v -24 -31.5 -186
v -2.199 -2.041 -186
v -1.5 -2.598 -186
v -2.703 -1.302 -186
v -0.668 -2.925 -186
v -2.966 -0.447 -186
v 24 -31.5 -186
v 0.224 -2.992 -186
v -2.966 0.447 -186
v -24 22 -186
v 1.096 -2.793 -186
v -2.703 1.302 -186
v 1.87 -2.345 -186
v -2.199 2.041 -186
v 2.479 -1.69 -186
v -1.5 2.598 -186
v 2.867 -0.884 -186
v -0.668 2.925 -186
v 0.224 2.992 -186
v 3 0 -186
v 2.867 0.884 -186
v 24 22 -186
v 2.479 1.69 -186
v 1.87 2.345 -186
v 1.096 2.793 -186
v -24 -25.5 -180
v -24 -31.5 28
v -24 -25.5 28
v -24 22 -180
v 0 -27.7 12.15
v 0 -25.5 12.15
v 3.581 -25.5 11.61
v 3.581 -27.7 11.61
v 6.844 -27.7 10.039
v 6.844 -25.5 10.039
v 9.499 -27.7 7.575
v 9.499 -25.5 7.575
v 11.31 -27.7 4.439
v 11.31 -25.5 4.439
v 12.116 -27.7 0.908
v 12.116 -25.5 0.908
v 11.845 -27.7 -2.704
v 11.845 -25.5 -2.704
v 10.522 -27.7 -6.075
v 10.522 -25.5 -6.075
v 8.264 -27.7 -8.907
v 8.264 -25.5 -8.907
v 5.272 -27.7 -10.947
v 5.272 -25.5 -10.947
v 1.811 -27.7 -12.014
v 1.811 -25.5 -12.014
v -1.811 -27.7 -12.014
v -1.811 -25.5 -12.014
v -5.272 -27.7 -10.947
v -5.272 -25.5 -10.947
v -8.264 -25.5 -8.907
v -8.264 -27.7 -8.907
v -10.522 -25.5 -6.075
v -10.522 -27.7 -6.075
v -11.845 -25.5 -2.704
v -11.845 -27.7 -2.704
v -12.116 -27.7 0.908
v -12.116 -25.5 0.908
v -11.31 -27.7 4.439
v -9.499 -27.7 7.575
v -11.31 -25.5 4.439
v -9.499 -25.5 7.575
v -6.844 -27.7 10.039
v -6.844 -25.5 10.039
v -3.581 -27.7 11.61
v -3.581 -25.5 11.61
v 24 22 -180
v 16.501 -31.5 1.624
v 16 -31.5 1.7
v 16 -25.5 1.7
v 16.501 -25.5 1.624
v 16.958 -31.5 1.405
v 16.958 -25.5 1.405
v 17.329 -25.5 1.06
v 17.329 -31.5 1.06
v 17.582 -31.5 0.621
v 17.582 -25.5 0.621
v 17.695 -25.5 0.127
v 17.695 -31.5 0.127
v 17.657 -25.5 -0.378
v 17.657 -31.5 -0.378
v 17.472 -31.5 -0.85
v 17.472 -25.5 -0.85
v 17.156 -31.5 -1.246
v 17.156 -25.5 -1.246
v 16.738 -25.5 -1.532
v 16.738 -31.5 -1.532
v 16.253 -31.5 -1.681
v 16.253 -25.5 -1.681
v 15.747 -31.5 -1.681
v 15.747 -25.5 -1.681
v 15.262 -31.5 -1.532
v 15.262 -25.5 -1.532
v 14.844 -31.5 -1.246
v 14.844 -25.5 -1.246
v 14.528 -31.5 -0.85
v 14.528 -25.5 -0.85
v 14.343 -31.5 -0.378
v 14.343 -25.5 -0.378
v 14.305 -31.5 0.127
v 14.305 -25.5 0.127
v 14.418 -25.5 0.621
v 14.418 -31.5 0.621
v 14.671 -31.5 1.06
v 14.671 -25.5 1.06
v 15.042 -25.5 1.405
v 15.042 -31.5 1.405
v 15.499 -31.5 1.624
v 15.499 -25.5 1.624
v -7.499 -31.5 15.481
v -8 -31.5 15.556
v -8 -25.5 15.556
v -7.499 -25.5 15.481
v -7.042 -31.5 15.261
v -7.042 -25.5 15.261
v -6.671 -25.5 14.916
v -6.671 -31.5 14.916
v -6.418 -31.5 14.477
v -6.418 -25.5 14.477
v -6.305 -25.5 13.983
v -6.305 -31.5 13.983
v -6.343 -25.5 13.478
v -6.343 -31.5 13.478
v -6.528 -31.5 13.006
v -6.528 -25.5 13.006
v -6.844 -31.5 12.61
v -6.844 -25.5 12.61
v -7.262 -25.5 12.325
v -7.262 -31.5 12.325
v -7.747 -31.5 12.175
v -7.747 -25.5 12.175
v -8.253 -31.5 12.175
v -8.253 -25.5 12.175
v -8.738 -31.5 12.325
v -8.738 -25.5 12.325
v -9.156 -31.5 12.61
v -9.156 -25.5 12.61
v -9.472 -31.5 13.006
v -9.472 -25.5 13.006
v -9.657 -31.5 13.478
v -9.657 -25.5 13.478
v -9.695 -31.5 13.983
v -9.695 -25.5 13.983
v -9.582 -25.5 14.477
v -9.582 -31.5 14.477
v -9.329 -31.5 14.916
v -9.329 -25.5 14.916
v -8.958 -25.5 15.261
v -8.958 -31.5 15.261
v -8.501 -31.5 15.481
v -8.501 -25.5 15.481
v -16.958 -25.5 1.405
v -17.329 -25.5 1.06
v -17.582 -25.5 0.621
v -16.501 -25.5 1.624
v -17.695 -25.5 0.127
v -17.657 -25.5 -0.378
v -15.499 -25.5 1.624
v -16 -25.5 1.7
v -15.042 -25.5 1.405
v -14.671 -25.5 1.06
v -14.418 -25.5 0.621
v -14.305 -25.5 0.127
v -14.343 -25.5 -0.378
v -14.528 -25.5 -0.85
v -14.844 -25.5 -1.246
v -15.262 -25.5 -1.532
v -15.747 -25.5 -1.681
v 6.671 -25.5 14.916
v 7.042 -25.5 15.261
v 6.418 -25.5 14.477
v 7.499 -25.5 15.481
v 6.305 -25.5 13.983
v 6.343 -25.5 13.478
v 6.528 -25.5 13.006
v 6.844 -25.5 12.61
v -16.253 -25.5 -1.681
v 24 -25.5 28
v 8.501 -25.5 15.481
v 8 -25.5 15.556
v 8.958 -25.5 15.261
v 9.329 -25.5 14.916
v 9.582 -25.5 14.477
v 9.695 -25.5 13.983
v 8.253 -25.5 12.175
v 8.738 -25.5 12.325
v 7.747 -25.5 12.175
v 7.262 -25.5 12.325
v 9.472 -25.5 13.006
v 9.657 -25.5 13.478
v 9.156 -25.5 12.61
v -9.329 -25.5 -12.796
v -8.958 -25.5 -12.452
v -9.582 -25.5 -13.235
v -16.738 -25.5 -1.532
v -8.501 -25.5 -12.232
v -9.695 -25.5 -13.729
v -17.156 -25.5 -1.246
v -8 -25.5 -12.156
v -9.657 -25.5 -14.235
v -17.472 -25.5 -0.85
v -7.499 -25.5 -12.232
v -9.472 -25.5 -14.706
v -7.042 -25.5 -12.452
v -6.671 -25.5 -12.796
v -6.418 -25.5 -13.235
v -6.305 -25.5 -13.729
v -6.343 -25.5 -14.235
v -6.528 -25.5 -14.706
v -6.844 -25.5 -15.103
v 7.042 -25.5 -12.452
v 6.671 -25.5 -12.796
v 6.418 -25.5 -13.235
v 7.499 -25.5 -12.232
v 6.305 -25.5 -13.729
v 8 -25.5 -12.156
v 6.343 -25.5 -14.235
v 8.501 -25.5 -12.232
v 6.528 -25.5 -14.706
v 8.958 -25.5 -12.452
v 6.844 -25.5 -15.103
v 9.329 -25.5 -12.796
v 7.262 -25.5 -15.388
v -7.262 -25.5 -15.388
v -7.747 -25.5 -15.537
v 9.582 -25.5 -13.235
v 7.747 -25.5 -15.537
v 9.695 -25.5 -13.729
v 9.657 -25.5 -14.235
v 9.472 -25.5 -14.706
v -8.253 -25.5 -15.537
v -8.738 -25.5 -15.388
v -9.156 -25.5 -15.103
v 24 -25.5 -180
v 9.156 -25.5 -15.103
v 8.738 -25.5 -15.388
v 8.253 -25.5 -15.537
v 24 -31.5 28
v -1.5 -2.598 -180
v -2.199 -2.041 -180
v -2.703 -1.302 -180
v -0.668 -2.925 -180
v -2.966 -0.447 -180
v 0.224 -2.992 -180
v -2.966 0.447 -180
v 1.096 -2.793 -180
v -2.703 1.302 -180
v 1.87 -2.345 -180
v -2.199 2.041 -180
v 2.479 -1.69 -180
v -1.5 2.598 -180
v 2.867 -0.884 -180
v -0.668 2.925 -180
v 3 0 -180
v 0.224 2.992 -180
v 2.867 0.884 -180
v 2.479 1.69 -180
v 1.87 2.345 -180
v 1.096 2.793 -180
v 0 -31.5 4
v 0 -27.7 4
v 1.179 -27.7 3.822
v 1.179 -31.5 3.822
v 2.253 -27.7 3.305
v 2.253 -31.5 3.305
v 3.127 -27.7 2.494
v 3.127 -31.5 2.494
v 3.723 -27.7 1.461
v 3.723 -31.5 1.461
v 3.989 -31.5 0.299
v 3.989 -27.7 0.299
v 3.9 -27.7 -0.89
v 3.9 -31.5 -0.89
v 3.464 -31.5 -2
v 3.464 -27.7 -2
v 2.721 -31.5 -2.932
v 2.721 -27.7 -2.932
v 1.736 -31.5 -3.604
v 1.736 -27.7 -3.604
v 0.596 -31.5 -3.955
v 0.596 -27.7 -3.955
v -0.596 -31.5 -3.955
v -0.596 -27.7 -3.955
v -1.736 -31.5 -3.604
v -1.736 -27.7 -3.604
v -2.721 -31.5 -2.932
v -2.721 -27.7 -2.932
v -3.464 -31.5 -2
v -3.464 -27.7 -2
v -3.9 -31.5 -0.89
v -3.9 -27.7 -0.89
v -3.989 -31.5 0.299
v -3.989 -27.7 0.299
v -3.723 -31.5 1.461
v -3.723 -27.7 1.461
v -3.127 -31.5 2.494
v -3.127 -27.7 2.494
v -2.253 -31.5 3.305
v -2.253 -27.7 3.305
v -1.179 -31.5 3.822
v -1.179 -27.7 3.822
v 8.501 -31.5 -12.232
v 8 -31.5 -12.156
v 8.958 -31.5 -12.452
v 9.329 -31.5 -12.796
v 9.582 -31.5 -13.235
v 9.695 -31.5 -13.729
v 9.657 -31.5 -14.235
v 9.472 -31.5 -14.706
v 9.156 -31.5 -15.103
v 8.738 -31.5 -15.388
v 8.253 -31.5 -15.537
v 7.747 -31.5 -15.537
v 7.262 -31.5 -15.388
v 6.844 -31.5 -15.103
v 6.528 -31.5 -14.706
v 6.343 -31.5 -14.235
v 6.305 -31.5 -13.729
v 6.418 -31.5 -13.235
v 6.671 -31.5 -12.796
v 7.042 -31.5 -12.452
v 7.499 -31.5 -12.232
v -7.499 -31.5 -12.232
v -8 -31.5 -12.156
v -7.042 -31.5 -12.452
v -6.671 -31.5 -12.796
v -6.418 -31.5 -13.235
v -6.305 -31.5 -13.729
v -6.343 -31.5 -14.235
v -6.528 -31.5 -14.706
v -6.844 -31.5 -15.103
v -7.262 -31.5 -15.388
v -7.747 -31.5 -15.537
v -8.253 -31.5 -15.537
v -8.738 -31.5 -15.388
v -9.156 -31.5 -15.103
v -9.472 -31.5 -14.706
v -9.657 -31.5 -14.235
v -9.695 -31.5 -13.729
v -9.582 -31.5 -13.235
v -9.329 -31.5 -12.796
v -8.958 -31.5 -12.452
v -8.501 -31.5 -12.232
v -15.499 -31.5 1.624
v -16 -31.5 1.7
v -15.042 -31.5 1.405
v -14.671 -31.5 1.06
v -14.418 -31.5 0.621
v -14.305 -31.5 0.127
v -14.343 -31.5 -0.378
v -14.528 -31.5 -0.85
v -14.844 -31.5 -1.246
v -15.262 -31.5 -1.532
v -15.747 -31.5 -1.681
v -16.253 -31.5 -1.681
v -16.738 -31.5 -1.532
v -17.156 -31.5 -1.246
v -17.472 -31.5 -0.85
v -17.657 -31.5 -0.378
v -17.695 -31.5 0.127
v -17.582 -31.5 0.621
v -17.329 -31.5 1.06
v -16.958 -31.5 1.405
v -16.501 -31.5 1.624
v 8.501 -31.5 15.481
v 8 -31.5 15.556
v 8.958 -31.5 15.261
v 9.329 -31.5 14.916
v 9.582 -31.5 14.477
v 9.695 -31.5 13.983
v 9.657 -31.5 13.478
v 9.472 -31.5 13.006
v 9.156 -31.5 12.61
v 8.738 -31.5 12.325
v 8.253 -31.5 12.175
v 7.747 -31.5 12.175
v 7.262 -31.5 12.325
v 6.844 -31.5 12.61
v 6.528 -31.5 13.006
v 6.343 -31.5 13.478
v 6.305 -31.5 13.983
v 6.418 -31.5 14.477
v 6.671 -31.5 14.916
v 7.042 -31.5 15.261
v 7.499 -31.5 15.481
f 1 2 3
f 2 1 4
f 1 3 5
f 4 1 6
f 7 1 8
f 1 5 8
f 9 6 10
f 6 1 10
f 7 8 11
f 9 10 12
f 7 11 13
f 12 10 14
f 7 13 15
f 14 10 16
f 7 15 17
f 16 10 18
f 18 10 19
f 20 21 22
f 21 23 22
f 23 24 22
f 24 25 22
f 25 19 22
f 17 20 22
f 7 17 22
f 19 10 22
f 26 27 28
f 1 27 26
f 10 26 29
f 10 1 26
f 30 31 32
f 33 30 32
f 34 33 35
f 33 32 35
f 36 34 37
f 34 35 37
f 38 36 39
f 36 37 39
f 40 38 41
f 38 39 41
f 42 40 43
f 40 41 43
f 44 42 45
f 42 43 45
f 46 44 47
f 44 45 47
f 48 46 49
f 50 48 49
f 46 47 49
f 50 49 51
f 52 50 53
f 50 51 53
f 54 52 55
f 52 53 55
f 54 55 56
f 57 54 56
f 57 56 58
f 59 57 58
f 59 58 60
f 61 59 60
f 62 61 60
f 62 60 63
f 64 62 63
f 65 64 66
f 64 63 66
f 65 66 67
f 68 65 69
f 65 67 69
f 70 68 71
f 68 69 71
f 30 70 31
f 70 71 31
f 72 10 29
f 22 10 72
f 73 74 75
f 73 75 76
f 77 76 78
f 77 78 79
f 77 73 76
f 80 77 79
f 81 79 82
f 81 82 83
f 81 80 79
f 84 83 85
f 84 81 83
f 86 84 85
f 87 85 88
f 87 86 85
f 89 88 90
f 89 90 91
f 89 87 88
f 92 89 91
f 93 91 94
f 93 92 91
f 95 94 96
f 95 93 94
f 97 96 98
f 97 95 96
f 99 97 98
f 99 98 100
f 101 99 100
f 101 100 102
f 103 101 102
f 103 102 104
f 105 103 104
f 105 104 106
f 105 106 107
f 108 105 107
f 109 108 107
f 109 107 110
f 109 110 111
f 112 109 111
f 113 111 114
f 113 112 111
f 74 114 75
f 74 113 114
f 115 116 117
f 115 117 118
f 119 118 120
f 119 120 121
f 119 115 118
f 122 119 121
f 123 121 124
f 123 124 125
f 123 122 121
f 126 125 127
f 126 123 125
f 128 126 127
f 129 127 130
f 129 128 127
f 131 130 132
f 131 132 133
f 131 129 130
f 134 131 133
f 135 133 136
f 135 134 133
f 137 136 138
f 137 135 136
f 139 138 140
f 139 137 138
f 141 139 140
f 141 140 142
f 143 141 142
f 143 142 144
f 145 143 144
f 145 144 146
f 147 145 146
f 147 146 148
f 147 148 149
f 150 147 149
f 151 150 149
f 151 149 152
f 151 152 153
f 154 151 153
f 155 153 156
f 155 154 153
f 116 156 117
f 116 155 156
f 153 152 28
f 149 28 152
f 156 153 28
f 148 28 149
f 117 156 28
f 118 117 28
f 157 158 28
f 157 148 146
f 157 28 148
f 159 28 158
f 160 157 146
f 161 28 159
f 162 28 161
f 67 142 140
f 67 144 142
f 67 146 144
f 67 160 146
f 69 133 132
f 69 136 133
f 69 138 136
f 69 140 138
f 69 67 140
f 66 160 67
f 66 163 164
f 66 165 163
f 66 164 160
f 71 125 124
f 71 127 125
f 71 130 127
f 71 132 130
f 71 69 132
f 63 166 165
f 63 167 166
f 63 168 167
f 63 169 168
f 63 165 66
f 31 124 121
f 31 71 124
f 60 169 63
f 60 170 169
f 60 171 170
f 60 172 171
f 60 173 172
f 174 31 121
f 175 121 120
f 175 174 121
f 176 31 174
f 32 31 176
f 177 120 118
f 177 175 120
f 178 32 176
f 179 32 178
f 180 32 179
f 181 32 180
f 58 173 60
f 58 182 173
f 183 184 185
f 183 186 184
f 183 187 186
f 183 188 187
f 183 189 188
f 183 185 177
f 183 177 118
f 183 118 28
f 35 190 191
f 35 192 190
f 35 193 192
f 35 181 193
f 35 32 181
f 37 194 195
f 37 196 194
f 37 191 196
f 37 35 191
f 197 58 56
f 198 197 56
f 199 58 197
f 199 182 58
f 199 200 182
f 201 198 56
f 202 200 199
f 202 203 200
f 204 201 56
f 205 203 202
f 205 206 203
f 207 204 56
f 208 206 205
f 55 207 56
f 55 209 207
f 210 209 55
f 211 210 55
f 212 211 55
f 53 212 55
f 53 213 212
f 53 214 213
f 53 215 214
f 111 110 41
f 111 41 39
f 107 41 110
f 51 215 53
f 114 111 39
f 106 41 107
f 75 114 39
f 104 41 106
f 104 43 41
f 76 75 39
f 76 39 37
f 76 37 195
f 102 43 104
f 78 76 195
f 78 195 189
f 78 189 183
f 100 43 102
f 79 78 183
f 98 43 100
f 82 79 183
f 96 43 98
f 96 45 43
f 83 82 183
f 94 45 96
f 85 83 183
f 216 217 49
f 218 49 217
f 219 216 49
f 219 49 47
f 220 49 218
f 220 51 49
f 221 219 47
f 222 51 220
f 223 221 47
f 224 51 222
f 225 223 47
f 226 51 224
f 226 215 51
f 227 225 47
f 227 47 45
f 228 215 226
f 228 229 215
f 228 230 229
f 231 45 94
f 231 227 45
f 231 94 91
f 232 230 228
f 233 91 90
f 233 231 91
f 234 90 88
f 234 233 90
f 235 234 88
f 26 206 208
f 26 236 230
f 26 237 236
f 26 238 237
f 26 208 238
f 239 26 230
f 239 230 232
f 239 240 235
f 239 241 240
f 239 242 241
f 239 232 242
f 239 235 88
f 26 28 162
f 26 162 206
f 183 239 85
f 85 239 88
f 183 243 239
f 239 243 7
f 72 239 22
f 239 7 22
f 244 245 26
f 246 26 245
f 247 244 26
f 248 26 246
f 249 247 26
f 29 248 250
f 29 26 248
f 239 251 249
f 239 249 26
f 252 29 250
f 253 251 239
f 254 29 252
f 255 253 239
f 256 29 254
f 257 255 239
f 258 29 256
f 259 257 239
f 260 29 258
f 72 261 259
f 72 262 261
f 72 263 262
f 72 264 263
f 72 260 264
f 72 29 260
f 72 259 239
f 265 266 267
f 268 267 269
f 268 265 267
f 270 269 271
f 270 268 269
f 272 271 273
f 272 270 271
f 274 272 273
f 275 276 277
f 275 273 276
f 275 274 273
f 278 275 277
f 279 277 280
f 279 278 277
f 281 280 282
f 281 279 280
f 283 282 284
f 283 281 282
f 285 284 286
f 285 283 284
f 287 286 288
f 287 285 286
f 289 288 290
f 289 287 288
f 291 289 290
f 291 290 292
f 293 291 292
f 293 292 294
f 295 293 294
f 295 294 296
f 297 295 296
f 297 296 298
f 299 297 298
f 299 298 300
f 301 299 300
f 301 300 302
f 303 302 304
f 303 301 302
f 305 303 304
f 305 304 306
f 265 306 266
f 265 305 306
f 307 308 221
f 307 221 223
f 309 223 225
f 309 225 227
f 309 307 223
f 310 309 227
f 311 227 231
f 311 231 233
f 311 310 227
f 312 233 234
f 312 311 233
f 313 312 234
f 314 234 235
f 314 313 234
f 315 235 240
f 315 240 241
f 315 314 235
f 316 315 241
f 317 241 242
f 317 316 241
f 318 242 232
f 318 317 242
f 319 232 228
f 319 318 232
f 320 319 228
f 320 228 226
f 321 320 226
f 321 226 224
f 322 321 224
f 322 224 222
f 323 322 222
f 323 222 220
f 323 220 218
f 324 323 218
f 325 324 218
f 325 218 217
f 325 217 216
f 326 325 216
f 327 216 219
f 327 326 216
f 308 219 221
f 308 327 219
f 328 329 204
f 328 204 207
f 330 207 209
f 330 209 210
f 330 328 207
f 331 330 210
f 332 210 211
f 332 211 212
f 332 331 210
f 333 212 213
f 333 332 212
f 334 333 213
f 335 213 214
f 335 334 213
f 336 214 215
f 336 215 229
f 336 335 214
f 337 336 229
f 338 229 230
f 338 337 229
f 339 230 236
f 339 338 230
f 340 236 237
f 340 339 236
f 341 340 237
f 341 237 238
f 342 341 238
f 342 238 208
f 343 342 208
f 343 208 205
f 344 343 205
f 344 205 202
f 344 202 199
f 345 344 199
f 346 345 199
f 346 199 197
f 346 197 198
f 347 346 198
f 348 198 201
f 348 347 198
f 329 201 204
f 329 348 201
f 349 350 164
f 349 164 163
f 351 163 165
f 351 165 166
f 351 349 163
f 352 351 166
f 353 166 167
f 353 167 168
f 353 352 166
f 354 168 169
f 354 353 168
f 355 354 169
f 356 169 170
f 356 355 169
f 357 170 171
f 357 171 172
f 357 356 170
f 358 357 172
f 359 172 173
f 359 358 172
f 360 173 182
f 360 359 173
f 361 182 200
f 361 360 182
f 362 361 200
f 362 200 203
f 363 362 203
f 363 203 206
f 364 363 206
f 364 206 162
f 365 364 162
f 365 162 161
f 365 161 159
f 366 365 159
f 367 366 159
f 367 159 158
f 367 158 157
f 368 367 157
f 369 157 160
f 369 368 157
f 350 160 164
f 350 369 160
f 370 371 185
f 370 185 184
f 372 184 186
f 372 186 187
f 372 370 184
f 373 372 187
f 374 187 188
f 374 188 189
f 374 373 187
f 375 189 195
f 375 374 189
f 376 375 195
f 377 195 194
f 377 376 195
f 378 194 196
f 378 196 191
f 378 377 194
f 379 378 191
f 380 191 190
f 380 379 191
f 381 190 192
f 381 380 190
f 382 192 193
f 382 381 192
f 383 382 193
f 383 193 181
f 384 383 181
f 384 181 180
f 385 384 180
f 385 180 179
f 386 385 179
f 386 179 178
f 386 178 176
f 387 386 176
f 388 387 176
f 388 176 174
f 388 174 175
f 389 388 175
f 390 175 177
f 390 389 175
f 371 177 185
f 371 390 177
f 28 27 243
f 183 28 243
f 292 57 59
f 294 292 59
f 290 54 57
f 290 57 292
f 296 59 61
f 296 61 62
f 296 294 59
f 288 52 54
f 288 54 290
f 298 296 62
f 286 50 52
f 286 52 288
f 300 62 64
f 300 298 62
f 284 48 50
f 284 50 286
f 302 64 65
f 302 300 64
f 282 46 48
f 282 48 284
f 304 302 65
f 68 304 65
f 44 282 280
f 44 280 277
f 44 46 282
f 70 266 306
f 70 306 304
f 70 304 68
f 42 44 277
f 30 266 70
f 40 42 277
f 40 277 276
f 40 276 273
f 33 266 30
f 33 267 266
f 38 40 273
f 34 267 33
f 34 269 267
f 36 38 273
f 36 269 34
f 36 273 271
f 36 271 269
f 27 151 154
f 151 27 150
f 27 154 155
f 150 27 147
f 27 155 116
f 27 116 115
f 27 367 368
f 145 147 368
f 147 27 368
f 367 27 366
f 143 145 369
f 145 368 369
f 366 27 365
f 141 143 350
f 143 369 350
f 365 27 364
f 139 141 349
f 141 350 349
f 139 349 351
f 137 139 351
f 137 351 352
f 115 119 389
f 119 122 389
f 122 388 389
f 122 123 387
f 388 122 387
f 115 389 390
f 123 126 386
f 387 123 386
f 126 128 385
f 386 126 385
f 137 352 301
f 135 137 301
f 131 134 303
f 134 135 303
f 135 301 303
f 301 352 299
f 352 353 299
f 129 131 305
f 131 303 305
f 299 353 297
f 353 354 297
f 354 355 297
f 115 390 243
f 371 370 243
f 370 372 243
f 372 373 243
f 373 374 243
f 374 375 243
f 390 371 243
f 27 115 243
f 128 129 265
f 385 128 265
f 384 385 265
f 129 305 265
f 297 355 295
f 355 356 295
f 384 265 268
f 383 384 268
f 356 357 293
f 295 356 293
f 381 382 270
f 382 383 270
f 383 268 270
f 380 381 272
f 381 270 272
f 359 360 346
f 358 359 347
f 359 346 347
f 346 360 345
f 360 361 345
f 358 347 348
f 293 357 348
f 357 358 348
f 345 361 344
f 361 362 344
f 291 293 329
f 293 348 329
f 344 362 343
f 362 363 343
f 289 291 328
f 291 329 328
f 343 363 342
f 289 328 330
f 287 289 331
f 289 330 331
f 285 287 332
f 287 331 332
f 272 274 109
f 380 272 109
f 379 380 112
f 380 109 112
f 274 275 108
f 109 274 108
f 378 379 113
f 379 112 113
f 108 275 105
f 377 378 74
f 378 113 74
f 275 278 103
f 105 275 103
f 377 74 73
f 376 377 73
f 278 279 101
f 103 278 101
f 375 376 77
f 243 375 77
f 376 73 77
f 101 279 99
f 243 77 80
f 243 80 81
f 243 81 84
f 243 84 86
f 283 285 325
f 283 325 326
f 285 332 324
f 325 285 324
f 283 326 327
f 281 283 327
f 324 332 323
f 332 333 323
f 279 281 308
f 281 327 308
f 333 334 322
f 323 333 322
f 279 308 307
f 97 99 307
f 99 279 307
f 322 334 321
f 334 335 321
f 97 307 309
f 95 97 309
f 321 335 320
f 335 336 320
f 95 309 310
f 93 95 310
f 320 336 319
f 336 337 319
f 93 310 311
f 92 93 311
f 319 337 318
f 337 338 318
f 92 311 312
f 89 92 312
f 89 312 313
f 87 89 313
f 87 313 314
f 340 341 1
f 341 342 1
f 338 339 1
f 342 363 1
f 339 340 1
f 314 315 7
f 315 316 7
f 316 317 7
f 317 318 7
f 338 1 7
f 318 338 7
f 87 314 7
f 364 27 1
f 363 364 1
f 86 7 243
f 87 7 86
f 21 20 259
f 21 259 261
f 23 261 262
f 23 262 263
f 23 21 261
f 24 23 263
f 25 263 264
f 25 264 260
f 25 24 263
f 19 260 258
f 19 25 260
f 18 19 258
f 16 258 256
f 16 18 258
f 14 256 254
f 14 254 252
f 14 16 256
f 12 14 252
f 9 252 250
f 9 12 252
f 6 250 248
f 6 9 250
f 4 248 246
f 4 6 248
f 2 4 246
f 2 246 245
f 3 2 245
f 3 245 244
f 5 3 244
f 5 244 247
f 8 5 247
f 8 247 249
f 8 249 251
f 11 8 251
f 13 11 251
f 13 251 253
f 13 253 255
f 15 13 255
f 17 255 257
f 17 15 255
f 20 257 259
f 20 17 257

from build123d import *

# Parameters (mm, degrees)
SK_FOREARM_PLATE_W       = 48
SK_FOREARM_PLATE_H       = 208
SK_FOREARM_PLATE_R       = 1.7
SK_FOREARM_PLATE_R_2     = 4
FOREARM_PLATE_DEPTH      = 6
SK_ELBOW_PILOT_RECESS_R  = 12.15
ELBOW_PILOT_RECESS_DEPTH = 2.2
SK_HAND_PLATE_W          = 48
SK_HAND_PLATE_H          = 53.5
SK_HAND_PLATE_R          = 3
HAND_PLATE_DEPTH         = 6


with BuildPart() as part:
    # SK_Forearm_Plate → Forearm_Plate (new body)
    with BuildSketch(Plane(origin=(0, -31.5, 0), x_dir=(1, 0, 0), z_dir=(0, 1, 0))):
        with Locations((0, 76)):
            Rectangle(SK_FOREARM_PLATE_W, SK_FOREARM_PLATE_H)
        with Locations(Location((16, 0, 0), (0, 0, 270))):
            Circle(SK_FOREARM_PLATE_R, mode=Mode.SUBTRACT)
        with Locations(Location((8, 13.856406461, 0), (0, 0, 270))):
            Circle(SK_FOREARM_PLATE_R, mode=Mode.SUBTRACT)
        with Locations(Location((-8, 13.856406461, 0), (0, 0, 270))):
            Circle(SK_FOREARM_PLATE_R, mode=Mode.SUBTRACT)
        with Locations(Location((-16, 0, 0), (0, 0, 270))):
            Circle(SK_FOREARM_PLATE_R, mode=Mode.SUBTRACT)
        with Locations(Location((-8, -13.856406461, 0), (0, 0, 270))):
            Circle(SK_FOREARM_PLATE_R, mode=Mode.SUBTRACT)
        with Locations(Location((8, -13.856406461, 0), (0, 0, 270))):
            Circle(SK_FOREARM_PLATE_R, mode=Mode.SUBTRACT)
        with Locations(Location((0, 0, 0), (0, 0, 270))):
            Circle(SK_FOREARM_PLATE_R_2, mode=Mode.SUBTRACT)
    extrude(amount=FOREARM_PLATE_DEPTH)

    # SK_Elbow_Pilot_Recess → Elbow_Pilot_Recess (cut)
    with BuildSketch(Plane(origin=(0, -25.5, 0), x_dir=(1, 0, 0), z_dir=(0, 1, 0))):
        with Locations(Location((0, 0, 0), (0, 0, 270))):
            Circle(SK_ELBOW_PILOT_RECESS_R)
    extrude(amount=-ELBOW_PILOT_RECESS_DEPTH, mode=Mode.SUBTRACT)

    # SK_Hand_Plate → Hand_Plate (add)
    with BuildSketch(Plane.XY.offset(-186)):
        with Locations((0, -4.75)):
            Rectangle(SK_HAND_PLATE_W, SK_HAND_PLATE_H)
        Circle(SK_HAND_PLATE_R, mode=Mode.SUBTRACT)
    extrude(amount=HAND_PLATE_DEPTH)


solid = part.part
